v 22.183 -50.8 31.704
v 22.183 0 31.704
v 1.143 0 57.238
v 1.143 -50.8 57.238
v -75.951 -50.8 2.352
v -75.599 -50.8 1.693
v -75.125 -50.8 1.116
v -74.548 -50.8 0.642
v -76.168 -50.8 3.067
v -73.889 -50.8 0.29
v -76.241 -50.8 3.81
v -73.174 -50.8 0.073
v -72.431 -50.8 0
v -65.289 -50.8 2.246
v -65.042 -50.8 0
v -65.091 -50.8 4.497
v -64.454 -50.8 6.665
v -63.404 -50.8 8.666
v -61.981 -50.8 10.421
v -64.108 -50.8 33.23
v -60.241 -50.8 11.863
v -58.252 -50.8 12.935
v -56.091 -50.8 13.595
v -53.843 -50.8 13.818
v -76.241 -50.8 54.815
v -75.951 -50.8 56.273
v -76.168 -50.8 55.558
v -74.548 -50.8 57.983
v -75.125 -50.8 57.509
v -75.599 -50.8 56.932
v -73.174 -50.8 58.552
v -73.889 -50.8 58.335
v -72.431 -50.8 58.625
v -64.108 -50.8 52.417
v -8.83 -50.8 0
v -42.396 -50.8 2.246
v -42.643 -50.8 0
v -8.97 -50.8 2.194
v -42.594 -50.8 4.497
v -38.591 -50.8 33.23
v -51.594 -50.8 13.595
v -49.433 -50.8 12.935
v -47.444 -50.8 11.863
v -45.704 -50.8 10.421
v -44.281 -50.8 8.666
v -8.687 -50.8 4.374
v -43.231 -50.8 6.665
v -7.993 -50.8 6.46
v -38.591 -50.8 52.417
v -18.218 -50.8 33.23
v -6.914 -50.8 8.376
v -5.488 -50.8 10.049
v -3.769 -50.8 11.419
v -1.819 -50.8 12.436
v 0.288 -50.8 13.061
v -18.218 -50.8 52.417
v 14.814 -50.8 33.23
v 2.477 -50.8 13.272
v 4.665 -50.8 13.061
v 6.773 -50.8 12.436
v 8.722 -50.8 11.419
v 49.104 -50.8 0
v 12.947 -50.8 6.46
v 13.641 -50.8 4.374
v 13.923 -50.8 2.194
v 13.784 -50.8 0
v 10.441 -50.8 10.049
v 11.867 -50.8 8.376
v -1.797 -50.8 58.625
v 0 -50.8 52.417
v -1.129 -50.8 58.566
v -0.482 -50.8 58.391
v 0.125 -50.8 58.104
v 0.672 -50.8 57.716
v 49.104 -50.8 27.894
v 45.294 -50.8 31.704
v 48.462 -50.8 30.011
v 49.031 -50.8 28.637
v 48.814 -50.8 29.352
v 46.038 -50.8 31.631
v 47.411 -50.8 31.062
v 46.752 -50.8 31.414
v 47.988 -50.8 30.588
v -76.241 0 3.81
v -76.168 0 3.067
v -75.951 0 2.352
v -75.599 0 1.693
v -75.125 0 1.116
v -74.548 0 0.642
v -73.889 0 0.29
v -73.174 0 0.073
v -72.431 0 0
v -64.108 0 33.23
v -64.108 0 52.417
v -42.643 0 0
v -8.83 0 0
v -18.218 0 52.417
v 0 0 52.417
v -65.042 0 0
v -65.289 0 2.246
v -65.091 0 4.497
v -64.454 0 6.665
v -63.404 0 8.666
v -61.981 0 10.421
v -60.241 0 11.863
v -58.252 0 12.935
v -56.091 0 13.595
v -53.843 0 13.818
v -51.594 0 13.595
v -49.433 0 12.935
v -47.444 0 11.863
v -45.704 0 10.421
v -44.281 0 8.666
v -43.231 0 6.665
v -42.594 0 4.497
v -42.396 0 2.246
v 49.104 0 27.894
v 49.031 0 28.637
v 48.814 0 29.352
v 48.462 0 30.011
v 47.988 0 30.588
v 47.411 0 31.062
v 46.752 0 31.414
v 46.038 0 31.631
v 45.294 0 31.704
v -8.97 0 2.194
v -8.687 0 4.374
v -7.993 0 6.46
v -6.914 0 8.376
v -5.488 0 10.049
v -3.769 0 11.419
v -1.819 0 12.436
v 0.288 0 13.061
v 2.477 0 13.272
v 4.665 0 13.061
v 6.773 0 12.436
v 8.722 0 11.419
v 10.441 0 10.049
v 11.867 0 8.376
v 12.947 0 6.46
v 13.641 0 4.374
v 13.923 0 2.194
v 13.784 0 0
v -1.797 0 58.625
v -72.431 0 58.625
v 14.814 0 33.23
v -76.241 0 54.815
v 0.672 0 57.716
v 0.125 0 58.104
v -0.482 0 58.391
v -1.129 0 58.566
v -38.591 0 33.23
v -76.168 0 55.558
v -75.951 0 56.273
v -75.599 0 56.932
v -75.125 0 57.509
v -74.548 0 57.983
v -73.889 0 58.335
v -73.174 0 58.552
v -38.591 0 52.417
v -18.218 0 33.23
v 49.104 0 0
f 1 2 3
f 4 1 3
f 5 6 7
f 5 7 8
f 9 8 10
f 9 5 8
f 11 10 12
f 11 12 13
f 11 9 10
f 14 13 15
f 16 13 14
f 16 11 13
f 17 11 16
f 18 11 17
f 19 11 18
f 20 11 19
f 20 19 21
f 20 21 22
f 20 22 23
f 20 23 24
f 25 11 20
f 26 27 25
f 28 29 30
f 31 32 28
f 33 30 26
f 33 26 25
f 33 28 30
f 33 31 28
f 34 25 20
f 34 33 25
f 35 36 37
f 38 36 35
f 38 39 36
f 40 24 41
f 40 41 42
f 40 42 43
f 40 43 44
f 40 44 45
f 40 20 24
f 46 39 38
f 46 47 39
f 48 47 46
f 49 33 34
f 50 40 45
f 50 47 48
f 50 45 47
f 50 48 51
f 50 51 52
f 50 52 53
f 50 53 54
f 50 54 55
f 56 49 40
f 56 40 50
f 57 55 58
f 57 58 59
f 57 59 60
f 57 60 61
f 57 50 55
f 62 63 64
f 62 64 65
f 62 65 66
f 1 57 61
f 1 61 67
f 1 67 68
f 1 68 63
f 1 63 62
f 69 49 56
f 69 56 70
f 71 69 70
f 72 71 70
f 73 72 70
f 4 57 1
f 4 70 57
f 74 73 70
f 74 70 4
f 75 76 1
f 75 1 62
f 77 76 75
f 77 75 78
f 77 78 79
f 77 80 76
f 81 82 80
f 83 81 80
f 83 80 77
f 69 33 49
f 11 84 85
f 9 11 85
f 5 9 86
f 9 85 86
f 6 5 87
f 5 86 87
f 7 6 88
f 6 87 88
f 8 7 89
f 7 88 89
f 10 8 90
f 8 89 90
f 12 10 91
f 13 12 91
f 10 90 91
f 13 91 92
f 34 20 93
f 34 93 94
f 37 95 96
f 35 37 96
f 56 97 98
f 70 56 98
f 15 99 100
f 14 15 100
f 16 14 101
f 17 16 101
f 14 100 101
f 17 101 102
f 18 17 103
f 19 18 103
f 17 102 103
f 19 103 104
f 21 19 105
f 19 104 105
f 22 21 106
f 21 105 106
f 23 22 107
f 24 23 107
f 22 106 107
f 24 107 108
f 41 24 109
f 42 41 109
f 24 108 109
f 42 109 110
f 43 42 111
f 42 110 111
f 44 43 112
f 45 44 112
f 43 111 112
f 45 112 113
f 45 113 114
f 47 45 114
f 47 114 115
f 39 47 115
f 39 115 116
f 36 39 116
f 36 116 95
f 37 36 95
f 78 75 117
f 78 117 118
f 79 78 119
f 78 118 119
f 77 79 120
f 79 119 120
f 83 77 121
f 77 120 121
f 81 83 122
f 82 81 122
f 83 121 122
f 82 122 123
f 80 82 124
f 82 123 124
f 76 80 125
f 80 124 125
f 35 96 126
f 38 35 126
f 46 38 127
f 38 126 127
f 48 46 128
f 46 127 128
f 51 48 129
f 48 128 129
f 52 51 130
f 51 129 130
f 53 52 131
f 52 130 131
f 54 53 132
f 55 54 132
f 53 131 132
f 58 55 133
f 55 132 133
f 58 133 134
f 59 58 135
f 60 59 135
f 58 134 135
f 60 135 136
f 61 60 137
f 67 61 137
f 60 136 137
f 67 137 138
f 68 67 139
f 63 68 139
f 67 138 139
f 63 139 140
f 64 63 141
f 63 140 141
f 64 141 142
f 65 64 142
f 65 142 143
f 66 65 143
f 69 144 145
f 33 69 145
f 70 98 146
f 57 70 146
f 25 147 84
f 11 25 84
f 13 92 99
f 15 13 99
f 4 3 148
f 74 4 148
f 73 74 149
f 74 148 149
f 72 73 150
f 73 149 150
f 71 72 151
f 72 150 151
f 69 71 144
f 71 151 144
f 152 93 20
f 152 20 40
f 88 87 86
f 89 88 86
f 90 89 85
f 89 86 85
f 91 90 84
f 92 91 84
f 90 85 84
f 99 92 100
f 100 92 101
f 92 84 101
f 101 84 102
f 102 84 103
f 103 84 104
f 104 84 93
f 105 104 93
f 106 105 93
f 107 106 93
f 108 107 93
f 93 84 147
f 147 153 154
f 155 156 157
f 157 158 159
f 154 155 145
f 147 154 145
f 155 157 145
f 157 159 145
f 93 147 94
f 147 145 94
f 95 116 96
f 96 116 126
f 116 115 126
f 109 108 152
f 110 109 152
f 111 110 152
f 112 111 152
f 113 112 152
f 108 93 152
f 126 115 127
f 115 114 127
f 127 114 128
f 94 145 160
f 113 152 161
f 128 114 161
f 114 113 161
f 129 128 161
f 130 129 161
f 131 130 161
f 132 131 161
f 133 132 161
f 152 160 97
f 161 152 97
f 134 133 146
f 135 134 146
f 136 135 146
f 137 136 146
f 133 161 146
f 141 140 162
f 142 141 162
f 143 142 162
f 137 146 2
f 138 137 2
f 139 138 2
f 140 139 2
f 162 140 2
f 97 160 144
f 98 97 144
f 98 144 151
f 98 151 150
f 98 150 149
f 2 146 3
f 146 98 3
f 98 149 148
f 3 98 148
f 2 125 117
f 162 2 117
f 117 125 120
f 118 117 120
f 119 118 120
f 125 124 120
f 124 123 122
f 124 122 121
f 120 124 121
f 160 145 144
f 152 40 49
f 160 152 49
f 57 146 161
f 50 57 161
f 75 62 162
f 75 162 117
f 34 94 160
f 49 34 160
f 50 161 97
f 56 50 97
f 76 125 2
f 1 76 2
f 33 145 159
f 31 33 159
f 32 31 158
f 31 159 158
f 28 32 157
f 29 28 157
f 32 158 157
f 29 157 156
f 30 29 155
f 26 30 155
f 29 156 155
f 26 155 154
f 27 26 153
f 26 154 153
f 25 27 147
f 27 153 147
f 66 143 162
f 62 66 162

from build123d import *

# Parameters (mm, degrees)
F0_W     = 25.516171
F0_H     = 19.186575
F1_DEPTH = 50.8


with BuildPart() as f1:
    # F0 (on Front) → F1 (new body)
    with BuildSketch(Plane.XZ):
        with BuildLine():
            ThreePointArc((-72.431024, 58.625113), (-75.125101, 57.50919), (-76.241024, 54.815113))
            Line((-76.241024, 54.815113), (-76.241024, 3.81))
            ThreePointArc((-76.241024, 3.81), (-75.125101, 1.115923), (-72.431024, 0))
            Line((-72.431024, 0), (-65.04178, 0))
            ThreePointArc((-65.04178, 0), (-53.842533, 13.818248), (-42.643286, 0))
            Line((-42.643286, 0), (-8.830175, 0))
            ThreePointArc((-8.830175, 0), (2.476757, 13.272119), (13.783689, 0))
            Line((13.783689, 0), (49.104389, 0))
            Line((49.104389, 0), (49.104389, 27.893852))
            ThreePointArc((49.104389, 27.893852), (47.988466, 30.587929), (45.294389, 31.703852))
            Line((45.294389, 31.703852), (22.183126, 31.703852))
            Line((22.183126, 31.703852), (1.142996, 57.237982))
            ThreePointArc((1.142996, 57.237982), (-0.171807, 58.260924), (-1.797379, 58.625113))
            Line((-1.797379, 58.625113), (-72.431024, 58.625113))
        make_face()
        with Locations((-51.349548, 42.823649)):
            Rectangle(F0_W, F0_H, mode=Mode.SUBTRACT)
        Polygon((-18.218089, 33.230361), (-18.218089, 52.416936), (0, 52.416936), (14.814471, 33.230361), align=None, mode=Mode.SUBTRACT)
    extrude(amount=F1_DEPTH)


solid = f1.part
